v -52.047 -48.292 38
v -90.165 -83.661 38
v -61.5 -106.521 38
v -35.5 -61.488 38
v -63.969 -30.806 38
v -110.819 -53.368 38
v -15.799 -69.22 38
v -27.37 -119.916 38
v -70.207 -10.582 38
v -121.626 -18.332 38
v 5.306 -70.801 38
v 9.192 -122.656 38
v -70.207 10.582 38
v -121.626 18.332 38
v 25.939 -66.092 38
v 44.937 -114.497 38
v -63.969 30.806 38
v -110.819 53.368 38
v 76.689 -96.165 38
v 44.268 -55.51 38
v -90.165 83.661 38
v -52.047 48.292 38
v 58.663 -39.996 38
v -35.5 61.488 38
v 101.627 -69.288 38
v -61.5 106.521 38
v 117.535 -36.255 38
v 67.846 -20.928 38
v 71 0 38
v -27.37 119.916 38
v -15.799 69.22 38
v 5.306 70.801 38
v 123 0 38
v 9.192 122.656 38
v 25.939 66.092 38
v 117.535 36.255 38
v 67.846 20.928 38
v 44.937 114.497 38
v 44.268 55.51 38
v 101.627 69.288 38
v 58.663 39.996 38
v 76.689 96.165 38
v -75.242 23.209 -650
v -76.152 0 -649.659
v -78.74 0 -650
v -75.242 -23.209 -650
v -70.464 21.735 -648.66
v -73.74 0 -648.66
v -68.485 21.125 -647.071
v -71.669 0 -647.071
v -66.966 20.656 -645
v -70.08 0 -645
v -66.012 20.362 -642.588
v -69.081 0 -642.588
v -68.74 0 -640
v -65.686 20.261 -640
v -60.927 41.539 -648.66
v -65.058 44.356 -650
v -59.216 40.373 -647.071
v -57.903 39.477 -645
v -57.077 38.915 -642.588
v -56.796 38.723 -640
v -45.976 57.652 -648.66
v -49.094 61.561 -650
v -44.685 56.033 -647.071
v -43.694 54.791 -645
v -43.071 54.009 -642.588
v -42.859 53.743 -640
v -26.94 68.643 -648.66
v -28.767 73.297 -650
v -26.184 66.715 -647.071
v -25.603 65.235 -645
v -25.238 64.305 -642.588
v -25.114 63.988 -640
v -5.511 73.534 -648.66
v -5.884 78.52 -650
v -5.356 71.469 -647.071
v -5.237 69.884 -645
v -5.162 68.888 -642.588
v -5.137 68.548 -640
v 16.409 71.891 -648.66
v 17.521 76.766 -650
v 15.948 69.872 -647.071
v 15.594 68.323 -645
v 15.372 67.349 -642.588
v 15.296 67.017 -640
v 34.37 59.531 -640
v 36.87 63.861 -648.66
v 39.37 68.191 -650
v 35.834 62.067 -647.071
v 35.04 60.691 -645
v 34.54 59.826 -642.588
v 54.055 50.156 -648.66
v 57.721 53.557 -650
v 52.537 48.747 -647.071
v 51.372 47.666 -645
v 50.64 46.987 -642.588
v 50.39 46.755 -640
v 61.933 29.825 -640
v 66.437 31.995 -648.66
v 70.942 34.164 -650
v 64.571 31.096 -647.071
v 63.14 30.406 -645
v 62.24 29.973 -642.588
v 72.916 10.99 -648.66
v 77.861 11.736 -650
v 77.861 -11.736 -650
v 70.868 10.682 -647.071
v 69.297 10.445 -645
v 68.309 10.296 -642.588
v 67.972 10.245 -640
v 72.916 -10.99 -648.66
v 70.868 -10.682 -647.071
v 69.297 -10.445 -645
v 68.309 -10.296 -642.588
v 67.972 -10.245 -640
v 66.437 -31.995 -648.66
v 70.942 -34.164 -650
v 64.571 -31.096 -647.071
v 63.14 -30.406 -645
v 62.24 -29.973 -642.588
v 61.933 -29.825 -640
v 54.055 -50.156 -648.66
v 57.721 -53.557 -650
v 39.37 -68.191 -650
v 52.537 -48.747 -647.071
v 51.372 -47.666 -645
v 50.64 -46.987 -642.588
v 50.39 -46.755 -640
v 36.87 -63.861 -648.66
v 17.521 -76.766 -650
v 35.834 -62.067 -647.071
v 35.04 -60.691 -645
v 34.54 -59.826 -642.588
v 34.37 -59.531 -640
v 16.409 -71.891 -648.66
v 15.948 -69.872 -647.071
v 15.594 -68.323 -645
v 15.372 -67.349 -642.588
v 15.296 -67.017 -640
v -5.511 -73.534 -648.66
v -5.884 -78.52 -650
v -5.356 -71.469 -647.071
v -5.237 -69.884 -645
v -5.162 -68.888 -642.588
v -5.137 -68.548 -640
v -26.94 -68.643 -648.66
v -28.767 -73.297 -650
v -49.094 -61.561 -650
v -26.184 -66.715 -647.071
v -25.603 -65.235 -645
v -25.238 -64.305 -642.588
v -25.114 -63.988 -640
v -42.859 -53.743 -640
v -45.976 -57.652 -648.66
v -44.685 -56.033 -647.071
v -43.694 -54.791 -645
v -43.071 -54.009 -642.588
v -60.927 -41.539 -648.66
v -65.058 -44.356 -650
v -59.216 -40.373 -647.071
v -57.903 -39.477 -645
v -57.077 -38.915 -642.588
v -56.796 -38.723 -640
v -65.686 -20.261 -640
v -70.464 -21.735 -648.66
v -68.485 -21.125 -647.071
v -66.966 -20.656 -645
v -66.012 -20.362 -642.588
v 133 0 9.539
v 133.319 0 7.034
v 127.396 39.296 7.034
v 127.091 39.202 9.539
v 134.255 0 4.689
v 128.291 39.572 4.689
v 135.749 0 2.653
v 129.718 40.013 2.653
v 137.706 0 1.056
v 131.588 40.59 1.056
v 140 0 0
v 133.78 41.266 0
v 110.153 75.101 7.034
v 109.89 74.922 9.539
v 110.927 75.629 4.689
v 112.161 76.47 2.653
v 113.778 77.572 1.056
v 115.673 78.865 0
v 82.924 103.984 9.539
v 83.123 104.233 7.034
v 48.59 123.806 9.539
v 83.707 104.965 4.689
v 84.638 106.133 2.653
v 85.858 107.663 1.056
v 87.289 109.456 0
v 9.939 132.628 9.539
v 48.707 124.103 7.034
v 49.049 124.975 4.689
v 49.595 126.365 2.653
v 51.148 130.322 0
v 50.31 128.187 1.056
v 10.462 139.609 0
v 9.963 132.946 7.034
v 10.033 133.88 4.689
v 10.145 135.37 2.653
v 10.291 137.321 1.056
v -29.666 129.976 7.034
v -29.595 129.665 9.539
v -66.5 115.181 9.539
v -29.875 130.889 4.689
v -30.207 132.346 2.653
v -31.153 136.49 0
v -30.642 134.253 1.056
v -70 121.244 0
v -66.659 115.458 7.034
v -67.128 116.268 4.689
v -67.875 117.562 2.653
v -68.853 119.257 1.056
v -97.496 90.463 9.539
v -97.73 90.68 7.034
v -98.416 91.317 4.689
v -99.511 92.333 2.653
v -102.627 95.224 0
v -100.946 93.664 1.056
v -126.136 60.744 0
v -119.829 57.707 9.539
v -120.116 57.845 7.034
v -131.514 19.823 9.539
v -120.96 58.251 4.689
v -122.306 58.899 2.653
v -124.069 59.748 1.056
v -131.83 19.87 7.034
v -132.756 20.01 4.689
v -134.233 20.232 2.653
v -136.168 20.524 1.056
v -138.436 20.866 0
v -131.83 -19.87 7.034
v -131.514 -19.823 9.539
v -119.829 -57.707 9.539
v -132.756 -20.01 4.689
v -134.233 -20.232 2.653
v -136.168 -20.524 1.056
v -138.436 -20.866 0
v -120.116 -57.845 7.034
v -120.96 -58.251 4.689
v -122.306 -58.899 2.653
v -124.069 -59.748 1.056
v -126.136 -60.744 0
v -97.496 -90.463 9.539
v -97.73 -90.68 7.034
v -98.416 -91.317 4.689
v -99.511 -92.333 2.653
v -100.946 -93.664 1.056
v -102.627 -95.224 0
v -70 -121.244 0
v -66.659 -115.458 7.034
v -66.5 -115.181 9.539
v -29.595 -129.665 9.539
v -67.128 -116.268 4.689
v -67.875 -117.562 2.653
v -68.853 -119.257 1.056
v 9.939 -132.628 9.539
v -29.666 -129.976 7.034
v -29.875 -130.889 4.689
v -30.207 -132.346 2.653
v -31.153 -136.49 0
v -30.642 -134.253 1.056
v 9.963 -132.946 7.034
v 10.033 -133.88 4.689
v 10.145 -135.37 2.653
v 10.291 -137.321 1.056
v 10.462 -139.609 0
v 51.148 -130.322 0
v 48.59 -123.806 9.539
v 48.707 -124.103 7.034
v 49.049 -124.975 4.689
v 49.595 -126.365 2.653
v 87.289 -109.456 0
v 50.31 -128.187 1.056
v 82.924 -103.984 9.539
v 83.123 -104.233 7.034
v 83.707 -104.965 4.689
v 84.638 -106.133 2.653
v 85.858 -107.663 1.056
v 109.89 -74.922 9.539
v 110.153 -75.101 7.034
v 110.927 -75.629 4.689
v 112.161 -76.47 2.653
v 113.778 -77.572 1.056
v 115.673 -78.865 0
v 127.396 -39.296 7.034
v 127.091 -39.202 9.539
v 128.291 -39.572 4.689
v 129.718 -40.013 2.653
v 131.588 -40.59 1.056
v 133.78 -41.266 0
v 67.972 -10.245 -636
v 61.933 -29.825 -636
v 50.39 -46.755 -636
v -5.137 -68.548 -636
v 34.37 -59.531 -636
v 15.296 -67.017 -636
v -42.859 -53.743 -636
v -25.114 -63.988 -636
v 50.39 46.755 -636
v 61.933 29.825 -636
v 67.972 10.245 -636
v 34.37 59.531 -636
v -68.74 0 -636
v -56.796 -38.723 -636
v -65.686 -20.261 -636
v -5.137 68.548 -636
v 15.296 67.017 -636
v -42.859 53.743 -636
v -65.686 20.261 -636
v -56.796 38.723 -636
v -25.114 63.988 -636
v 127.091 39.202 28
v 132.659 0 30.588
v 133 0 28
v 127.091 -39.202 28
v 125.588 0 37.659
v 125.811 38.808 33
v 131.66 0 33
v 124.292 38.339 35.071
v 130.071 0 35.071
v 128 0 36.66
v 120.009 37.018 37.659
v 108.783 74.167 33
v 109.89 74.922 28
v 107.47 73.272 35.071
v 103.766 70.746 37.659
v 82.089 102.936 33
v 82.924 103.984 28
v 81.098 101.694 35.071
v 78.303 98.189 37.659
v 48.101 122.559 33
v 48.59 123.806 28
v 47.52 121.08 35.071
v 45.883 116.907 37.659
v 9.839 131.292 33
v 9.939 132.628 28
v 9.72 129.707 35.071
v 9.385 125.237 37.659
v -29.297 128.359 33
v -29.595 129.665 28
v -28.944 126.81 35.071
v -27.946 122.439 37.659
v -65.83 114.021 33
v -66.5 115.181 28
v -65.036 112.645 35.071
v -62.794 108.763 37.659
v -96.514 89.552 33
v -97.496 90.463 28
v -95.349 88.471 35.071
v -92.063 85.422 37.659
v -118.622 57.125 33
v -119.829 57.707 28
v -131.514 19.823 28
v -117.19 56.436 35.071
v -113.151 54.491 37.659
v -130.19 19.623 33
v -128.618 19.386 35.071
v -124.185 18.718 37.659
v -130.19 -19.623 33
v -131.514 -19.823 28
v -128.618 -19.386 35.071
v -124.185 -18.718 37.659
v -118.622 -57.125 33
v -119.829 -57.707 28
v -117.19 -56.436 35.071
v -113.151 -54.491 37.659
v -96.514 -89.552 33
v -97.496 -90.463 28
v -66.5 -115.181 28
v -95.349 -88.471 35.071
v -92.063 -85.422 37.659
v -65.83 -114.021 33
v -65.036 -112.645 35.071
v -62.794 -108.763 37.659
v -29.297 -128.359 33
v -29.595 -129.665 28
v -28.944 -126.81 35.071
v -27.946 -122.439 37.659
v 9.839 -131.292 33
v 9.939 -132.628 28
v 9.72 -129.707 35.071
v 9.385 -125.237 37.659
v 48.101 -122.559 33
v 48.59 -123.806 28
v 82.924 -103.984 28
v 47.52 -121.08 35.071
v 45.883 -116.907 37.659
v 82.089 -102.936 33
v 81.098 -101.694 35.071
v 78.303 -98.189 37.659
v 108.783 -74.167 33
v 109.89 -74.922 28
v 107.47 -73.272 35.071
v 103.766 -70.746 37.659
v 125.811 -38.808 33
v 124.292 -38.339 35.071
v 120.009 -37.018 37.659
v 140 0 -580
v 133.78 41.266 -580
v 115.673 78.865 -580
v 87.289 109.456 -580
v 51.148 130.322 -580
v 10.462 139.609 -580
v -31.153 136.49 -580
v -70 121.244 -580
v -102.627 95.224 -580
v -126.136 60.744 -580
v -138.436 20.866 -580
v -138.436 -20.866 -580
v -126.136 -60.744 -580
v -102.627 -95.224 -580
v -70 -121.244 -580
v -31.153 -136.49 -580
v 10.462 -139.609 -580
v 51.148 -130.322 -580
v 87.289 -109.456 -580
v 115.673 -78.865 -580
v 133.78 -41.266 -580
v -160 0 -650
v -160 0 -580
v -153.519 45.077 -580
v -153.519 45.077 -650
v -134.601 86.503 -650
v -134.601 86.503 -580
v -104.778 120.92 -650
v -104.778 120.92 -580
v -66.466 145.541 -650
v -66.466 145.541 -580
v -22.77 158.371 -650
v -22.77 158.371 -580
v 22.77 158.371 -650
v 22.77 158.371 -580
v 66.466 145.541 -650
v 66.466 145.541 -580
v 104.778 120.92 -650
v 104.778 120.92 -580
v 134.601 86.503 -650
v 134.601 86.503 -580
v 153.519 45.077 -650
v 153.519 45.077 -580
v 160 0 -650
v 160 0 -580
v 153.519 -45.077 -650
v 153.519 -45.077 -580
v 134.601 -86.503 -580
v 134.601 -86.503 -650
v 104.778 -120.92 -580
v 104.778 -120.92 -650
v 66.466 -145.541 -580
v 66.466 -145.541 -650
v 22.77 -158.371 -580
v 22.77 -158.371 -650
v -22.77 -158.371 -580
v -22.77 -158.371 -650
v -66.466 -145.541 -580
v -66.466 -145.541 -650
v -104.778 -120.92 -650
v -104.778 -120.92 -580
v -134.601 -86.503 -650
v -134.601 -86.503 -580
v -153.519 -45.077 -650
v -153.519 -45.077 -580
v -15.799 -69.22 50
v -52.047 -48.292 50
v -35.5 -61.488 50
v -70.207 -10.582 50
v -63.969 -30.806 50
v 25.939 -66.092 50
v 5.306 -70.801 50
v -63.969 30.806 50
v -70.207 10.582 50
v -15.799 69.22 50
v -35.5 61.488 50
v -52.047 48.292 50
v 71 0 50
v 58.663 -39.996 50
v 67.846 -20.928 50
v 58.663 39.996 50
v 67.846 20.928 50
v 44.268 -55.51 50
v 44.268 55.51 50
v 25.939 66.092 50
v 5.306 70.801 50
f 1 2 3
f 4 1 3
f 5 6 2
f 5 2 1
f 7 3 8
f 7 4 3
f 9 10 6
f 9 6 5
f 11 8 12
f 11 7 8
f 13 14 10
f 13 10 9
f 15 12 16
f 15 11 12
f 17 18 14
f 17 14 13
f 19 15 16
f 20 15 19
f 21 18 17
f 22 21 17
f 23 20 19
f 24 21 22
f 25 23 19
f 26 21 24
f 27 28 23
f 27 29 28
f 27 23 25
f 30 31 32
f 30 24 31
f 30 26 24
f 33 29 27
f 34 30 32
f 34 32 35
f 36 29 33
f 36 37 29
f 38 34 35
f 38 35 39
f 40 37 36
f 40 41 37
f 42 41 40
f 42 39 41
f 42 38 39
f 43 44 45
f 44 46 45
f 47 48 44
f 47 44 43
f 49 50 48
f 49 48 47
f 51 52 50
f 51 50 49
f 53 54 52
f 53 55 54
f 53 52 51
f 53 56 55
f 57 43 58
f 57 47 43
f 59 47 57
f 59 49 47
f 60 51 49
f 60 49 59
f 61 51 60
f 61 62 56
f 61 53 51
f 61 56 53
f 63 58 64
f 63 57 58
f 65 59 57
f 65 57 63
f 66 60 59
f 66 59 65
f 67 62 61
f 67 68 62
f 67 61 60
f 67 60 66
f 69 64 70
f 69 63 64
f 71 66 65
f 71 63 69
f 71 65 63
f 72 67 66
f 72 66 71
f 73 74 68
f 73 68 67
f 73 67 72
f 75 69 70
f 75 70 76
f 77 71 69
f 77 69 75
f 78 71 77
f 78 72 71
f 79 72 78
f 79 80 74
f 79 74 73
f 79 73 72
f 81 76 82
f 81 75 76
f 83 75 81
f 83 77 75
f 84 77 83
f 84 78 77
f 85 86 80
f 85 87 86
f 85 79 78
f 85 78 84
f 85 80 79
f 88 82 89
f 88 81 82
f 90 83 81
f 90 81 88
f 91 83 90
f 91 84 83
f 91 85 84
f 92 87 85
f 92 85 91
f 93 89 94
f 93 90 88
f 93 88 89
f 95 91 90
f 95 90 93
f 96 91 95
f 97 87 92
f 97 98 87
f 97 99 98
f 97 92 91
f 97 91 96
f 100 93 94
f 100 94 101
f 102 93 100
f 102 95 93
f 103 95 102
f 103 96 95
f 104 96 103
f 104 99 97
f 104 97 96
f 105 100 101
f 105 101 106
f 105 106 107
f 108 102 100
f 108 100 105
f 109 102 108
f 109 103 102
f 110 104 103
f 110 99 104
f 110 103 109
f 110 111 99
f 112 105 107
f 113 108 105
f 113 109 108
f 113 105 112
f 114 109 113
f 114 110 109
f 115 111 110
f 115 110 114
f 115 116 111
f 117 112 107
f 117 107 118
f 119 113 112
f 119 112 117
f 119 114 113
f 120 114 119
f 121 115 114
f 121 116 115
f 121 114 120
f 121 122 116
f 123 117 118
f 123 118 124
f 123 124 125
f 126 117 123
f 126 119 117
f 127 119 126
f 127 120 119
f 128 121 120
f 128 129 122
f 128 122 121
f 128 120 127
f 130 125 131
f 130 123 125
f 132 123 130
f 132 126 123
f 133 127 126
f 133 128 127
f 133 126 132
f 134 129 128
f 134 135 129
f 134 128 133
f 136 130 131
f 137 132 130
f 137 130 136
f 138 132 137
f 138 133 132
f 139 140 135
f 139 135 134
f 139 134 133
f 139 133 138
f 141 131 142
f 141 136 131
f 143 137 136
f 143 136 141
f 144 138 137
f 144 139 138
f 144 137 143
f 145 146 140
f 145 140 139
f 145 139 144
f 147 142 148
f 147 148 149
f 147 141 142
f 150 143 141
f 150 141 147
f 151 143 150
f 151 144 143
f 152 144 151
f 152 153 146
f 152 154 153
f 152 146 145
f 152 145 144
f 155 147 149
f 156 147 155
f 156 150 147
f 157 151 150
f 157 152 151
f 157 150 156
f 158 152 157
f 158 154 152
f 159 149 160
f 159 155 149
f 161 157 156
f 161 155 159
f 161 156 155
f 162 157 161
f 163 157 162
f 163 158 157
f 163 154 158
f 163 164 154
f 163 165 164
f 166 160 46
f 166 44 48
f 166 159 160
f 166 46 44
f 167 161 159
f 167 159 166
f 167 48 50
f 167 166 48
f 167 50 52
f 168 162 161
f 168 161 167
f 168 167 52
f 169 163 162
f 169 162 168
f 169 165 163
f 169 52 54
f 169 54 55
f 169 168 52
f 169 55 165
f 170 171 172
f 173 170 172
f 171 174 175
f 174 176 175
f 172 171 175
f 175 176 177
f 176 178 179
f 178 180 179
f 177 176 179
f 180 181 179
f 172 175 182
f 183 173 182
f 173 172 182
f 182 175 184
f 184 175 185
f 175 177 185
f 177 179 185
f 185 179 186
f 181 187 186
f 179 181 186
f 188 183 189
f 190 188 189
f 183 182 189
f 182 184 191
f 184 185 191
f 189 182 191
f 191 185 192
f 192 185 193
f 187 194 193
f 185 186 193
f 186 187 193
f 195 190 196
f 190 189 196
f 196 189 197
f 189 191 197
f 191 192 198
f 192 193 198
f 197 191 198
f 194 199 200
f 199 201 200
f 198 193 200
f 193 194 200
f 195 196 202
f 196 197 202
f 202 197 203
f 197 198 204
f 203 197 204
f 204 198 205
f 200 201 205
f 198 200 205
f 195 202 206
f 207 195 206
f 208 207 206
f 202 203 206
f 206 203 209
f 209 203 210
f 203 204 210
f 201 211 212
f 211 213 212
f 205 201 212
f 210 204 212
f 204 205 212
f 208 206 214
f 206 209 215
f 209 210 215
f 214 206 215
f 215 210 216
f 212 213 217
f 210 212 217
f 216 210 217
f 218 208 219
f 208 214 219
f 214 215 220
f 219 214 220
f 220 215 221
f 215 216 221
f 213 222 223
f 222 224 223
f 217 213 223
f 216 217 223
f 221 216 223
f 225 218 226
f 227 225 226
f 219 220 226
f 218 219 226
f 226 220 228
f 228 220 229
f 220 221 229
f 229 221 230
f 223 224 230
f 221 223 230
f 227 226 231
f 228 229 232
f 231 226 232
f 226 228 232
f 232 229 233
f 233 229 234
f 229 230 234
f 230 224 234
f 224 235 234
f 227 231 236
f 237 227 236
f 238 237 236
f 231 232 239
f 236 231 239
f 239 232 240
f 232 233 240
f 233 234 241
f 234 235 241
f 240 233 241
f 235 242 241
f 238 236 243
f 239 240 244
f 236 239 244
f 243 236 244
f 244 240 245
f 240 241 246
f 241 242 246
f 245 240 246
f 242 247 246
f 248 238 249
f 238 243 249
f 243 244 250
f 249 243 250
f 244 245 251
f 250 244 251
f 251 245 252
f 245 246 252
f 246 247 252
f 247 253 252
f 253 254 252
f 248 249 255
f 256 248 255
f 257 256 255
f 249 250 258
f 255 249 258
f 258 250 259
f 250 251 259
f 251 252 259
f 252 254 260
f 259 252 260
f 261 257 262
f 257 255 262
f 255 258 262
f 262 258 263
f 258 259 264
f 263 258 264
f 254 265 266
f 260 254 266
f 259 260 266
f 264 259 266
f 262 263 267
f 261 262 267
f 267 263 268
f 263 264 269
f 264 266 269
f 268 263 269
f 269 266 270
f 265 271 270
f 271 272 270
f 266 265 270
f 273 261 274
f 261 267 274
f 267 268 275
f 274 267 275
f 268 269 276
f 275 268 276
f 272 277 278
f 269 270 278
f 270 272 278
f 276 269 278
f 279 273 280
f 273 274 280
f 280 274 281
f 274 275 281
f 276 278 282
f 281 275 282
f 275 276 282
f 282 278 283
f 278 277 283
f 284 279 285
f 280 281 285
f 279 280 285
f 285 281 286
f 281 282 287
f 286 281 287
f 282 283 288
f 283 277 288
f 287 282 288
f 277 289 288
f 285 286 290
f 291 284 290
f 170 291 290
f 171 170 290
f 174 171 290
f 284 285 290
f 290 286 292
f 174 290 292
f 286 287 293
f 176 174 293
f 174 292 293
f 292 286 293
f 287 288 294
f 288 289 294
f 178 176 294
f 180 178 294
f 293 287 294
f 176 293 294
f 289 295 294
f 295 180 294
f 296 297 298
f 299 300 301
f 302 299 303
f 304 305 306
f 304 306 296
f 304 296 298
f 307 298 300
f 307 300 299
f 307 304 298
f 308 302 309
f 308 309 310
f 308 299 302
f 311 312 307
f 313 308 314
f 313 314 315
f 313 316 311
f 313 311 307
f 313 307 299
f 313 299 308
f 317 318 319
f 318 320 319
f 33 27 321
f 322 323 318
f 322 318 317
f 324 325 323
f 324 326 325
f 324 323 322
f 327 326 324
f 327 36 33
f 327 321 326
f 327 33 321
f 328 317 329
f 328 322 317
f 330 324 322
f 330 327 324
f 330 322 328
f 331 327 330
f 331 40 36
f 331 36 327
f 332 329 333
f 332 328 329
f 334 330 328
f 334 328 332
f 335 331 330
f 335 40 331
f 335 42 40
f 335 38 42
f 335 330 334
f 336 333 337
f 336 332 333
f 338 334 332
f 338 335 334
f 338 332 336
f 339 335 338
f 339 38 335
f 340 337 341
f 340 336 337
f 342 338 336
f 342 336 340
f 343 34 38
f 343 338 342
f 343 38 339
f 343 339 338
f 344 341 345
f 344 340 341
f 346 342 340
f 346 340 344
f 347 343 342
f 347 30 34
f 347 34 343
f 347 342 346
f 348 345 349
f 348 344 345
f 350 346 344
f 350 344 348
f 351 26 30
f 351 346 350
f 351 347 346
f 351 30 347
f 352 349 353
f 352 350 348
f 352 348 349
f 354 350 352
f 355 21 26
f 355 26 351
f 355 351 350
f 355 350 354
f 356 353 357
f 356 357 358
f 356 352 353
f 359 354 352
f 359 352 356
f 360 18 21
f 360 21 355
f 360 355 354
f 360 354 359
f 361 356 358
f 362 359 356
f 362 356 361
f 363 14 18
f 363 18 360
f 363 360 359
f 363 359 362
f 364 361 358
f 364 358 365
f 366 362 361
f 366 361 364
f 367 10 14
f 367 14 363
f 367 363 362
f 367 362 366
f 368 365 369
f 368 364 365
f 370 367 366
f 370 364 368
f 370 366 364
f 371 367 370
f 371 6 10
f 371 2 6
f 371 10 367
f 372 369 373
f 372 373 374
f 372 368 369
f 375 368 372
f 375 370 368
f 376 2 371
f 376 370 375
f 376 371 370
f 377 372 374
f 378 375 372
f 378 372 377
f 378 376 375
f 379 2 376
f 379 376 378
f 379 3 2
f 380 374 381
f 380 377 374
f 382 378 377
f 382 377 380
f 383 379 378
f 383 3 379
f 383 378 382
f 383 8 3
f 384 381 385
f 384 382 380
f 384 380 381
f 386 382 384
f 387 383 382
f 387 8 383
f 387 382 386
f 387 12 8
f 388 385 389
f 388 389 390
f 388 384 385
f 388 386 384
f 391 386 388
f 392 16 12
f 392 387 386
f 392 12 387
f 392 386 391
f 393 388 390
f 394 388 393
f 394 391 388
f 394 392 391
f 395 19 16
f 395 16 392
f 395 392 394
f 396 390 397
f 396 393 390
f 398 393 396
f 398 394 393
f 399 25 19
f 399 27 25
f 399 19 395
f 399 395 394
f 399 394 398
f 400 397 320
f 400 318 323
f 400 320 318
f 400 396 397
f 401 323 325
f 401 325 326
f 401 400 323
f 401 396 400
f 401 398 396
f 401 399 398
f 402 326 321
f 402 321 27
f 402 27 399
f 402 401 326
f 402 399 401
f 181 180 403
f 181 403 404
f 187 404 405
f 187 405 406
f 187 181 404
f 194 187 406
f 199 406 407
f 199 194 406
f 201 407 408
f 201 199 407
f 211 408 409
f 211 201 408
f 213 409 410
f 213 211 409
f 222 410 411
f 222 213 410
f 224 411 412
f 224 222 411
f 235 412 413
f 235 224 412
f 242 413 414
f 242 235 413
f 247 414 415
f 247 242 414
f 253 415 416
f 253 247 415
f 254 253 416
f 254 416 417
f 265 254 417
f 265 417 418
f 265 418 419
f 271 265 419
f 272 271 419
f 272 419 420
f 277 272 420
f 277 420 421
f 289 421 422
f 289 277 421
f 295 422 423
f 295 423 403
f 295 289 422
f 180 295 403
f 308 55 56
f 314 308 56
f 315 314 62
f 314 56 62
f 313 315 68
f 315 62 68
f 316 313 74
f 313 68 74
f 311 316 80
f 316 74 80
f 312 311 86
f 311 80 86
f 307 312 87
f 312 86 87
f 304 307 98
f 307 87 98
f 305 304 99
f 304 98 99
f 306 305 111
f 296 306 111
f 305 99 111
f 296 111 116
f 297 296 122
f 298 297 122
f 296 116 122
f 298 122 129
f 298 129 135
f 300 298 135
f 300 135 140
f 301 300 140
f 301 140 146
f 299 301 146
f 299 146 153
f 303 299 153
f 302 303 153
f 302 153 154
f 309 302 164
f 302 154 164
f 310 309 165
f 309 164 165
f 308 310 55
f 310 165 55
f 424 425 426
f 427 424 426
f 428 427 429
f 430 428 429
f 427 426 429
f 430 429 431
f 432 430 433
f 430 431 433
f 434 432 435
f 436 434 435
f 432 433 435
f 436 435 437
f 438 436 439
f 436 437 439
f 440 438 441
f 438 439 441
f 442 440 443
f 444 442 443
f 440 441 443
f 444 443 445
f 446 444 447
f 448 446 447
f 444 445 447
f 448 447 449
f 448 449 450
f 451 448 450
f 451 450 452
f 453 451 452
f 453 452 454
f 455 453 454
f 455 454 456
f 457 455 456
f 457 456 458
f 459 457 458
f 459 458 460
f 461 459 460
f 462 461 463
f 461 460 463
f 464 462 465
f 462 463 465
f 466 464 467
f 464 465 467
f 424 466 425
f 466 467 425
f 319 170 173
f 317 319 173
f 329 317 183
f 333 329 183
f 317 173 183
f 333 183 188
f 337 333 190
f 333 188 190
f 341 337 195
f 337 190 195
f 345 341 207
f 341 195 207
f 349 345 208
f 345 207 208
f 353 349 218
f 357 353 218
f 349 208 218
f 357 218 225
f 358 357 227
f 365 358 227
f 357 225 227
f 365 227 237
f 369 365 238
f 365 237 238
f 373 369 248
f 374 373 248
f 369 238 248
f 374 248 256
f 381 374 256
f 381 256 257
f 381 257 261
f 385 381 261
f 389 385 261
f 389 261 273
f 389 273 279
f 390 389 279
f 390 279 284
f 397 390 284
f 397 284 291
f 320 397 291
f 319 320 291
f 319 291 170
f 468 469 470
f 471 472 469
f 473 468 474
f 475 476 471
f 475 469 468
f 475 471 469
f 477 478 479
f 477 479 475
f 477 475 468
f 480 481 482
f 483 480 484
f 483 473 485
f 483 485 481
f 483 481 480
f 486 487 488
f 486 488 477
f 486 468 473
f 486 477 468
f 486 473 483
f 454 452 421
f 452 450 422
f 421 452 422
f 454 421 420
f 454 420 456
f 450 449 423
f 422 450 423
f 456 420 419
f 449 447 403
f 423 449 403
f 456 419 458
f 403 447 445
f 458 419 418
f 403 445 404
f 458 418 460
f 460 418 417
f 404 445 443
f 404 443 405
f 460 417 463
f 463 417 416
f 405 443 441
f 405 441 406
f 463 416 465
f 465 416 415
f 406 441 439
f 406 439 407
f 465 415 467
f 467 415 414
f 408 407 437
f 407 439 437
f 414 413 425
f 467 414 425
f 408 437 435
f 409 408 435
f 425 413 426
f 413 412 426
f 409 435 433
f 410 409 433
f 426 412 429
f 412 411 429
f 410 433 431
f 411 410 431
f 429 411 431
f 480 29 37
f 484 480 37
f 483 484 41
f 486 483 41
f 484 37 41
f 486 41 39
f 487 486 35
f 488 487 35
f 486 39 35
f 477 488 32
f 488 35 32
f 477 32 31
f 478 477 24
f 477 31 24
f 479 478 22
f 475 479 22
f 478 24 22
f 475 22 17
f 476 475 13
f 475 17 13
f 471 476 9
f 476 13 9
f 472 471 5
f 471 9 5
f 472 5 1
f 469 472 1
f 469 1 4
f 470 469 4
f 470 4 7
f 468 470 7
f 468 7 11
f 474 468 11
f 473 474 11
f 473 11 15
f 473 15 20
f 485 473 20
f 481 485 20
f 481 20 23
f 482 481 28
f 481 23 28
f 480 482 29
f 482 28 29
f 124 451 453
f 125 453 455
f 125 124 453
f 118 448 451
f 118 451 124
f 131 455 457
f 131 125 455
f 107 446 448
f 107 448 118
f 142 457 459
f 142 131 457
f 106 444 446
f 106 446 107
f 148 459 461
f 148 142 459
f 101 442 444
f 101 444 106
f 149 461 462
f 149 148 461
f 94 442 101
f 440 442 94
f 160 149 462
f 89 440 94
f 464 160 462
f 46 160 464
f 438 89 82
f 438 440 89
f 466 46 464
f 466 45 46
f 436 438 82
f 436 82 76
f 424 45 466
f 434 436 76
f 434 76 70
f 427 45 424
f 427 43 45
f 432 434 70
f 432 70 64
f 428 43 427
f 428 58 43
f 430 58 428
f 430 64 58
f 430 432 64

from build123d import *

# Parameters (mm, degrees)
SKETCH1_R           = 140
BOSS_EXTRUDE1_DEPTH = 580
SKETCH2_R           = 133
BOSS_EXTRUDE2_DEPTH = 38
SKETCH3_R           = 71
BOSS_EXTRUDE3_DEPTH = 12
FILLET2_R           = 10
SKETCH4_R           = 160
BOSS_EXTRUDE4_DEPTH = 70
SKETCH5_R           = 68.74
CUT_EXTRUDE1_DEPTH  = 14
FILLET3_R           = 10


with BuildPart() as part:
    # Sketch1 → Boss-Extrude1 (new body)
    with BuildSketch(Plane.XY):
        Circle(SKETCH1_R)
    extrude(amount=-BOSS_EXTRUDE1_DEPTH)

    # Sketch2 → Boss-Extrude2 (add)
    with BuildSketch(Plane.XY):
        Circle(SKETCH2_R)
    extrude(amount=BOSS_EXTRUDE2_DEPTH)

    # Sketch3 → Boss-Extrude3 (add)
    with BuildSketch(Plane.XY.offset(38)):
        Circle(SKETCH3_R)
    extrude(amount=BOSS_EXTRUDE3_DEPTH)

    # Fillet2
    # the kernel refuses this fillet: 10 mm, written as the material it adds along each edge
    with BuildSketch(Plane(origin=(0, 0, 0), x_dir=(1, 0, 0), z_dir=(0, -1, 0))) as fillet2_piece_1:
        with BuildLine():
            CenterArc((143, 9.539392014), FILLET2_R, 180, 72.542396876)
            Line((133, 9.539392014), (133, 0))
            Line((133, 0), (140, 0))
        make_face()
    revolve(axis=Axis((0, 0, 0), (0, 0, 1)))
    # the kernel refuses this fillet: 10 mm, written as the material it takes off along each edge
    with BuildSketch(Plane(origin=(0, 0, 38), x_dir=(1, 0, 0), z_dir=(0, -1, 0))) as fillet2_2_piece_1:
        with BuildLine():
            CenterArc((133 - FILLET2_R, -FILLET2_R), FILLET2_R, 0, 90)
            Line((133 - FILLET2_R, 0), (133, 0))
            Line((133, 0), (133, -FILLET2_R))
        make_face()
    revolve(axis=Axis((0, 0, 38), (0, 0, 1)), mode=Mode.SUBTRACT)

    # Sketch4 → Boss-Extrude4 (add)
    with BuildSketch(Plane(origin=(0, 0, -580), x_dir=(-1, 0, 0), z_dir=(0, 0, -1))):
        Circle(SKETCH4_R)
    extrude(amount=BOSS_EXTRUDE4_DEPTH)

    # Sketch5 → Cut-Extrude1 (cut)
    with BuildSketch(Plane(origin=(0, 0, -650), x_dir=(-1, 0, 0), z_dir=(0, 0, -1))):
        Circle(SKETCH5_R)
    extrude(amount=-CUT_EXTRUDE1_DEPTH, mode=Mode.SUBTRACT)

    # Fillet3
    fillet3_edges = [part.edges().sort_by_distance(p)[0] for p in [
        (68.74, 0, -650),
    ]]
    fillet(fillet3_edges, radius=FILLET3_R)


solid = part.part
